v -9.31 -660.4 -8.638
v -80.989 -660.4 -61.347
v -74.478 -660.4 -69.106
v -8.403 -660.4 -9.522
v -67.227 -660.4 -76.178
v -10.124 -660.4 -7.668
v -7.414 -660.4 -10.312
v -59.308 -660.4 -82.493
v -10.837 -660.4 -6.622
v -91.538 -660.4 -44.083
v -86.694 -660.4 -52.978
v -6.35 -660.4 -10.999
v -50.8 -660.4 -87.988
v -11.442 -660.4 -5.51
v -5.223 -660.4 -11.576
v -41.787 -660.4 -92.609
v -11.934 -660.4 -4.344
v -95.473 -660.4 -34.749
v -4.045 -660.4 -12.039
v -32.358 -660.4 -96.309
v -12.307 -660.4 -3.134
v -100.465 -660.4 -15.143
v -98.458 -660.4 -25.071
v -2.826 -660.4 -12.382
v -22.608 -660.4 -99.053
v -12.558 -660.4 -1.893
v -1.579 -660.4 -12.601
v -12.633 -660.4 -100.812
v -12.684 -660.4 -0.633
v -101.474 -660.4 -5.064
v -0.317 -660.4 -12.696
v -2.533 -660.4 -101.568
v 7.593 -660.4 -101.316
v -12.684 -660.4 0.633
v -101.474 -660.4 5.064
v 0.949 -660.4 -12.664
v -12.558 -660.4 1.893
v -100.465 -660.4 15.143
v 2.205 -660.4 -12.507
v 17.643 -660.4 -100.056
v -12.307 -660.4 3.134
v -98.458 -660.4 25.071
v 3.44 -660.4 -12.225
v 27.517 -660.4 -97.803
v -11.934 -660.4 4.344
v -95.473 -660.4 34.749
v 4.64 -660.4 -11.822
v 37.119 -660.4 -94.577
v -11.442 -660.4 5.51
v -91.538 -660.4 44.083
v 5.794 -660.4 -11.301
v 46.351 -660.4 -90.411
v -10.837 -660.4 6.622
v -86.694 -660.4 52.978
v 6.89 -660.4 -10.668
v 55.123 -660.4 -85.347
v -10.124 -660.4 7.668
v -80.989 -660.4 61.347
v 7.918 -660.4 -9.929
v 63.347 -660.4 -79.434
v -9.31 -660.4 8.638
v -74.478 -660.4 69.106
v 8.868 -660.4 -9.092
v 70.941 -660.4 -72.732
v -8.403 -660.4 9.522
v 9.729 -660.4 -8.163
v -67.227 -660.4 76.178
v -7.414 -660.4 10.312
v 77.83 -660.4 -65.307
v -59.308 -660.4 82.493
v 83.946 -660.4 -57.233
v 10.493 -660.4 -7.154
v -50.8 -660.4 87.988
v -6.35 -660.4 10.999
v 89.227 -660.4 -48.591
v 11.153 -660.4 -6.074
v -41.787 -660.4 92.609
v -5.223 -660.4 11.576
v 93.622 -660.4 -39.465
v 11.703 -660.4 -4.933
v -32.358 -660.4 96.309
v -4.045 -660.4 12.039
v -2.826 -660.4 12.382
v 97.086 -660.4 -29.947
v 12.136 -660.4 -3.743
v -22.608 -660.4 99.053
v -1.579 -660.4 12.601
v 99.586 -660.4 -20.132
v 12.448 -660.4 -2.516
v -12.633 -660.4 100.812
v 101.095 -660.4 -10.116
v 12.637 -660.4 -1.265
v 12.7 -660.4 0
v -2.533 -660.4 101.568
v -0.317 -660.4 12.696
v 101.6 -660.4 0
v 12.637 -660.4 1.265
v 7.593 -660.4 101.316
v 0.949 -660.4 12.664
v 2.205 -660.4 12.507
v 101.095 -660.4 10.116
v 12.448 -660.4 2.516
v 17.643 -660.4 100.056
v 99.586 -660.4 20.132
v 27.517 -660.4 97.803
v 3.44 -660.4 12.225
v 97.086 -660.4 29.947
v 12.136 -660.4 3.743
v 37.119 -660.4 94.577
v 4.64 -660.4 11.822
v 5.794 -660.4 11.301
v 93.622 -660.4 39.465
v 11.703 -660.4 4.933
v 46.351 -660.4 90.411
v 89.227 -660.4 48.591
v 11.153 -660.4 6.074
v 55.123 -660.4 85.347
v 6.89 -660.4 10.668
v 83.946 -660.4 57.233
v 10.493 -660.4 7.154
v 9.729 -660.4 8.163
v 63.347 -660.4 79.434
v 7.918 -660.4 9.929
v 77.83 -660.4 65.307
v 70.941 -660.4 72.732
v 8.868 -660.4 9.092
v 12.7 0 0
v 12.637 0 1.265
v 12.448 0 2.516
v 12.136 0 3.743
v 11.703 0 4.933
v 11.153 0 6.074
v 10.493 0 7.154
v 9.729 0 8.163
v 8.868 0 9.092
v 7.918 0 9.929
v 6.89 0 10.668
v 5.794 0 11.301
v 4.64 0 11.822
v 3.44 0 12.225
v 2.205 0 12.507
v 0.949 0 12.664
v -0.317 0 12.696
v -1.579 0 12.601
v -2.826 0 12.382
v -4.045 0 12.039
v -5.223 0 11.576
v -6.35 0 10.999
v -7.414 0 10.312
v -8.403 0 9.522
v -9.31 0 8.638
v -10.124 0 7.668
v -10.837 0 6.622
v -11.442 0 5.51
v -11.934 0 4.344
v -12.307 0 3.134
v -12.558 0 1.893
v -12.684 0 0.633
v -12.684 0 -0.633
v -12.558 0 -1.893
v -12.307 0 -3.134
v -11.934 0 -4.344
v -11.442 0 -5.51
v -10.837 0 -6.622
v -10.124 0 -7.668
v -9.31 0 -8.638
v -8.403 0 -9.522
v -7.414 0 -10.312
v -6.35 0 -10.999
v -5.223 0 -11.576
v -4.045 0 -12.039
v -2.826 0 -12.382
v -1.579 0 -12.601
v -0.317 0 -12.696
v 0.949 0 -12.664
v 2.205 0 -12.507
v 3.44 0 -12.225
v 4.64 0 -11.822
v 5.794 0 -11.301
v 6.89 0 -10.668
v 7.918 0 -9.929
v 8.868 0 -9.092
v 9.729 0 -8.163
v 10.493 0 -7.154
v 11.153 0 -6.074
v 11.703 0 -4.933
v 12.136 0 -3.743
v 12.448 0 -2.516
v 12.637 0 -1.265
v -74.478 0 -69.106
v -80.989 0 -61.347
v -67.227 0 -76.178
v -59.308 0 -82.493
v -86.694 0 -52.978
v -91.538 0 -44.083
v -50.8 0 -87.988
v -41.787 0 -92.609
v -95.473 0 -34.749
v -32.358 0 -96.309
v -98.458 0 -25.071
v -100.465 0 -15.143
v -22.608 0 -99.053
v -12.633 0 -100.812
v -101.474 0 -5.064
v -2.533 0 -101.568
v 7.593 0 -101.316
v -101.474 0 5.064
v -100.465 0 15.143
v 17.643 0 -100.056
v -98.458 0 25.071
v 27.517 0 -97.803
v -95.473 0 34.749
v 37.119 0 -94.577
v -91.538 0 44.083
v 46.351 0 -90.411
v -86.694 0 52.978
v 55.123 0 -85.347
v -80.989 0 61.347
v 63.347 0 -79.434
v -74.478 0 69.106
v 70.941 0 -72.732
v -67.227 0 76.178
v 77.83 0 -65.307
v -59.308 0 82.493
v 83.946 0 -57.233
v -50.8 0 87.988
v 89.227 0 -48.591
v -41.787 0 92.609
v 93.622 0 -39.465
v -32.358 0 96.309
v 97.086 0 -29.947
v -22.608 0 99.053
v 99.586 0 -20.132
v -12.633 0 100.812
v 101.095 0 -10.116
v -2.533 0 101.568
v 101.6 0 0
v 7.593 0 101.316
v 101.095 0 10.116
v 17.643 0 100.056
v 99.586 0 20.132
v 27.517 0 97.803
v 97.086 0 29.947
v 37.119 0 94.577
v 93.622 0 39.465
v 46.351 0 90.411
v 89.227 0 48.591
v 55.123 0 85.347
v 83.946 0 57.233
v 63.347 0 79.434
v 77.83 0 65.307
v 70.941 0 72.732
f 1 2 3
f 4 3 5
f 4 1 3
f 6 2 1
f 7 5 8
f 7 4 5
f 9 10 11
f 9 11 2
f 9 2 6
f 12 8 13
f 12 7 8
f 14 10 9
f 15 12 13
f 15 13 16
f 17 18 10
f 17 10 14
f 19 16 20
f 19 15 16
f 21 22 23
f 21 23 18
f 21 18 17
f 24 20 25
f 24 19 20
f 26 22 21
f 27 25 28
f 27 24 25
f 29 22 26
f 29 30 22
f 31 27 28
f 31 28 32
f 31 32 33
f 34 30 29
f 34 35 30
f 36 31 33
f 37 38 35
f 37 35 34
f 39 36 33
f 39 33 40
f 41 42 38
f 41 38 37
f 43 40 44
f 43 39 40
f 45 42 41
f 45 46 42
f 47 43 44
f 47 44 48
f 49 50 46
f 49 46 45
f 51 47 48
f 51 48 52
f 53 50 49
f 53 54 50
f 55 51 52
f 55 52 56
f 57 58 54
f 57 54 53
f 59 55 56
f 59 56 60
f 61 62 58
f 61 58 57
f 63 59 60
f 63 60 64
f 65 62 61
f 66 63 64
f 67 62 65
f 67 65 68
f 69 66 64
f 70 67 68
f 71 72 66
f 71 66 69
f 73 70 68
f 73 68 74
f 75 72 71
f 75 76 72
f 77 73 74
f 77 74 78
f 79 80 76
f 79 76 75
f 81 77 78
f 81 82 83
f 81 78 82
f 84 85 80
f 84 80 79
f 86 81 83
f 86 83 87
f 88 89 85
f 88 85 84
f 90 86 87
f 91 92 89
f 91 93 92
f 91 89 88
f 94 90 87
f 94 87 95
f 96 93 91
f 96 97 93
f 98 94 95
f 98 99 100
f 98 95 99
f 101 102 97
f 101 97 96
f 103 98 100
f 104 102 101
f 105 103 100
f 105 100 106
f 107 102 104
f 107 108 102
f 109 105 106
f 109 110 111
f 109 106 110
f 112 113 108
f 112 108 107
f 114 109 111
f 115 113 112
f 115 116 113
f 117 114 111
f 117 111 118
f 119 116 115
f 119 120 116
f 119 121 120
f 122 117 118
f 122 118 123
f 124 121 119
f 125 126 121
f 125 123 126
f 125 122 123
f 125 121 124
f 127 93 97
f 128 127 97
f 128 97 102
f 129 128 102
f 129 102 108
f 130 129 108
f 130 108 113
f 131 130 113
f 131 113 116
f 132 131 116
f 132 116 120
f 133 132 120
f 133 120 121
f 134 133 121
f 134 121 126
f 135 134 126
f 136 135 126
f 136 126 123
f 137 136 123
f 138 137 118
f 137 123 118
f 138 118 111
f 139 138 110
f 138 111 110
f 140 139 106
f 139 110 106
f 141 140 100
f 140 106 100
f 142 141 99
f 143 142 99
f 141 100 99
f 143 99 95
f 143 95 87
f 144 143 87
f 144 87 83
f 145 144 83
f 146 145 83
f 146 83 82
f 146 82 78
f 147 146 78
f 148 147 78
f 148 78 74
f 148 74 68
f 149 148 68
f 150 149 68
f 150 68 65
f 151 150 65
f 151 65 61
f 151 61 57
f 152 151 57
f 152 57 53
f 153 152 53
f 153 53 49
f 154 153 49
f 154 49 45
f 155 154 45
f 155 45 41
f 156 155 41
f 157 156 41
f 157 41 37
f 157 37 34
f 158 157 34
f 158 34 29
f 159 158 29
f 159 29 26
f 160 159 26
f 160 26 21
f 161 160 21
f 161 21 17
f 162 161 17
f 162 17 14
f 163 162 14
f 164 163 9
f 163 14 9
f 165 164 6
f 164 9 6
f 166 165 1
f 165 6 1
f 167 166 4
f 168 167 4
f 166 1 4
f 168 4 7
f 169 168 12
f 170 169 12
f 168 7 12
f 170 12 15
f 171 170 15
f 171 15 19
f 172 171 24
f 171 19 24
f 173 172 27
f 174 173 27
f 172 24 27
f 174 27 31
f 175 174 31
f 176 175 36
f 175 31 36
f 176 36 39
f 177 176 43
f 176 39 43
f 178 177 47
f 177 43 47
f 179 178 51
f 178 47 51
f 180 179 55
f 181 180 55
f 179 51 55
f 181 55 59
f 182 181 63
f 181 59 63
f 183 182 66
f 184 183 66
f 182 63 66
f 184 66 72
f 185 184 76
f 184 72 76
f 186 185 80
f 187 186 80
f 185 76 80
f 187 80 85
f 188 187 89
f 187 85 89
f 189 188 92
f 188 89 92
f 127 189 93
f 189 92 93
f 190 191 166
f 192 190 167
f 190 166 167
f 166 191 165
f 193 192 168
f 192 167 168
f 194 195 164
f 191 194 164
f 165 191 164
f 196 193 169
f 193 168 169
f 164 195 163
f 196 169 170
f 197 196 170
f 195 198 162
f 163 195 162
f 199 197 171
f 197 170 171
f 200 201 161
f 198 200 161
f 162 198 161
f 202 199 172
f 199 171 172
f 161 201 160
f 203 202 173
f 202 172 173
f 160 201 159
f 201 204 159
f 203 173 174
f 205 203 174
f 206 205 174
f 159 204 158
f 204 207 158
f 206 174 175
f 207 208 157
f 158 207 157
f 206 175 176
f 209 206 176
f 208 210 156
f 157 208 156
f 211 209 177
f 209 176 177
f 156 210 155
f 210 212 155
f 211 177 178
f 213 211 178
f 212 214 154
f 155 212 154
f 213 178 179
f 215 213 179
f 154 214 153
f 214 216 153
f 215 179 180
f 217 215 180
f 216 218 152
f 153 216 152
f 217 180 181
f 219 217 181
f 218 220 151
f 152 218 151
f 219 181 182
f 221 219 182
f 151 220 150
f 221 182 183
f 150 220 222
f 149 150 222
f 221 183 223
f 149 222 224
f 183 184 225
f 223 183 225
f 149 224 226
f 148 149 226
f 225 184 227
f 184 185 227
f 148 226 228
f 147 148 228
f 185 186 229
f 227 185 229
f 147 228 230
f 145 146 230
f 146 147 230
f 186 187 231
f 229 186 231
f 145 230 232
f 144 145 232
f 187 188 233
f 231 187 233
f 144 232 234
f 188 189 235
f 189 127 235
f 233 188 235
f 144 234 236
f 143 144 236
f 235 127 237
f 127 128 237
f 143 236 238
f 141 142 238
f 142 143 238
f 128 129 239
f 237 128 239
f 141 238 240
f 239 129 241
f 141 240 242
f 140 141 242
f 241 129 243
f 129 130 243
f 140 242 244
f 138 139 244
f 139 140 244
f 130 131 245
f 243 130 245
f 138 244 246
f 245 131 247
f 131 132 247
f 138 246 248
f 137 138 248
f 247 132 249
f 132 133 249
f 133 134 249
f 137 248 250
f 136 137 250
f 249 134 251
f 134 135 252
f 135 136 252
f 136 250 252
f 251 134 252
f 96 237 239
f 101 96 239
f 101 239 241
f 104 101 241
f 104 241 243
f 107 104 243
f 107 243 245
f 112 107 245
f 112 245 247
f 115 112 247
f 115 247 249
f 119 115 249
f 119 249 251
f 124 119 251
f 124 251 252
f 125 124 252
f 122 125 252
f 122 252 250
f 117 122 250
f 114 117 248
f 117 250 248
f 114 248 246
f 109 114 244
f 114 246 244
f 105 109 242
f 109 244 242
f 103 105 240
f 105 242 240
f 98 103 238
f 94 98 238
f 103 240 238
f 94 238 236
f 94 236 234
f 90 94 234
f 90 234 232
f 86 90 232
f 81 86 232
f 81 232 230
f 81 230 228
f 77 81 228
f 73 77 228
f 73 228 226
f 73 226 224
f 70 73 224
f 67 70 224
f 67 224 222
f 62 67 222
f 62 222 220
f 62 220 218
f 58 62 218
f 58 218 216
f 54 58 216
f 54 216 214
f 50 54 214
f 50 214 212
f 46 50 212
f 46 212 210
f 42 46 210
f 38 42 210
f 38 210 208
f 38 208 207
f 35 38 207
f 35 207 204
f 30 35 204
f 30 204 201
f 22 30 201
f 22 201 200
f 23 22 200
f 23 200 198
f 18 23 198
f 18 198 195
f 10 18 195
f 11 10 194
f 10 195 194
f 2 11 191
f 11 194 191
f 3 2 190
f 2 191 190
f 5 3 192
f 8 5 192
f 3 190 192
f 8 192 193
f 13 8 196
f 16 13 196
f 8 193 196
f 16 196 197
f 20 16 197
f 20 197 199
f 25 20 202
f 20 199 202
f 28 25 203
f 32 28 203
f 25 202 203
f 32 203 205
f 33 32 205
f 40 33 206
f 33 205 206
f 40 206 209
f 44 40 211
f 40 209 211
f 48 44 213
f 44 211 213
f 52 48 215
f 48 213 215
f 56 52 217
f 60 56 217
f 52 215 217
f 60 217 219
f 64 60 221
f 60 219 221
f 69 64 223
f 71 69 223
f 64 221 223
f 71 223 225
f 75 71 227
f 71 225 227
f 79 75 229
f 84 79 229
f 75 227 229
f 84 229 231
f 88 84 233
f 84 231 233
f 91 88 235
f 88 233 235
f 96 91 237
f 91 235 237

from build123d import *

# Parameters (mm, degrees)
F0_R     = 101.6
F1_DEPTH = 762
F2_R     = 12.7
F3_DEPTH = 762.001
F4_DEPTH = 101.6


with BuildPart() as f1:
    # F0 (on Front) → F1 (new body)
    with BuildSketch(Plane.XZ):
        Circle(F0_R)
    extrude(amount=F1_DEPTH)

    # F2 (on face) → F3 (cut, through all)
    with BuildSketch(Plane.XZ.offset(762)):
        Circle(F2_R)
    extrude(amount=-F3_DEPTH, mode=Mode.SUBTRACT)

    # F4 (cut): a face of the model
    f4_faces = [f1.faces().sort_by_distance(p)[0] for p in [
        (-98.7263180413, -762, 0),
    ]]
    extrude(f4_faces, amount=-F4_DEPTH, mode=Mode.SUBTRACT)


solid = f1.part
